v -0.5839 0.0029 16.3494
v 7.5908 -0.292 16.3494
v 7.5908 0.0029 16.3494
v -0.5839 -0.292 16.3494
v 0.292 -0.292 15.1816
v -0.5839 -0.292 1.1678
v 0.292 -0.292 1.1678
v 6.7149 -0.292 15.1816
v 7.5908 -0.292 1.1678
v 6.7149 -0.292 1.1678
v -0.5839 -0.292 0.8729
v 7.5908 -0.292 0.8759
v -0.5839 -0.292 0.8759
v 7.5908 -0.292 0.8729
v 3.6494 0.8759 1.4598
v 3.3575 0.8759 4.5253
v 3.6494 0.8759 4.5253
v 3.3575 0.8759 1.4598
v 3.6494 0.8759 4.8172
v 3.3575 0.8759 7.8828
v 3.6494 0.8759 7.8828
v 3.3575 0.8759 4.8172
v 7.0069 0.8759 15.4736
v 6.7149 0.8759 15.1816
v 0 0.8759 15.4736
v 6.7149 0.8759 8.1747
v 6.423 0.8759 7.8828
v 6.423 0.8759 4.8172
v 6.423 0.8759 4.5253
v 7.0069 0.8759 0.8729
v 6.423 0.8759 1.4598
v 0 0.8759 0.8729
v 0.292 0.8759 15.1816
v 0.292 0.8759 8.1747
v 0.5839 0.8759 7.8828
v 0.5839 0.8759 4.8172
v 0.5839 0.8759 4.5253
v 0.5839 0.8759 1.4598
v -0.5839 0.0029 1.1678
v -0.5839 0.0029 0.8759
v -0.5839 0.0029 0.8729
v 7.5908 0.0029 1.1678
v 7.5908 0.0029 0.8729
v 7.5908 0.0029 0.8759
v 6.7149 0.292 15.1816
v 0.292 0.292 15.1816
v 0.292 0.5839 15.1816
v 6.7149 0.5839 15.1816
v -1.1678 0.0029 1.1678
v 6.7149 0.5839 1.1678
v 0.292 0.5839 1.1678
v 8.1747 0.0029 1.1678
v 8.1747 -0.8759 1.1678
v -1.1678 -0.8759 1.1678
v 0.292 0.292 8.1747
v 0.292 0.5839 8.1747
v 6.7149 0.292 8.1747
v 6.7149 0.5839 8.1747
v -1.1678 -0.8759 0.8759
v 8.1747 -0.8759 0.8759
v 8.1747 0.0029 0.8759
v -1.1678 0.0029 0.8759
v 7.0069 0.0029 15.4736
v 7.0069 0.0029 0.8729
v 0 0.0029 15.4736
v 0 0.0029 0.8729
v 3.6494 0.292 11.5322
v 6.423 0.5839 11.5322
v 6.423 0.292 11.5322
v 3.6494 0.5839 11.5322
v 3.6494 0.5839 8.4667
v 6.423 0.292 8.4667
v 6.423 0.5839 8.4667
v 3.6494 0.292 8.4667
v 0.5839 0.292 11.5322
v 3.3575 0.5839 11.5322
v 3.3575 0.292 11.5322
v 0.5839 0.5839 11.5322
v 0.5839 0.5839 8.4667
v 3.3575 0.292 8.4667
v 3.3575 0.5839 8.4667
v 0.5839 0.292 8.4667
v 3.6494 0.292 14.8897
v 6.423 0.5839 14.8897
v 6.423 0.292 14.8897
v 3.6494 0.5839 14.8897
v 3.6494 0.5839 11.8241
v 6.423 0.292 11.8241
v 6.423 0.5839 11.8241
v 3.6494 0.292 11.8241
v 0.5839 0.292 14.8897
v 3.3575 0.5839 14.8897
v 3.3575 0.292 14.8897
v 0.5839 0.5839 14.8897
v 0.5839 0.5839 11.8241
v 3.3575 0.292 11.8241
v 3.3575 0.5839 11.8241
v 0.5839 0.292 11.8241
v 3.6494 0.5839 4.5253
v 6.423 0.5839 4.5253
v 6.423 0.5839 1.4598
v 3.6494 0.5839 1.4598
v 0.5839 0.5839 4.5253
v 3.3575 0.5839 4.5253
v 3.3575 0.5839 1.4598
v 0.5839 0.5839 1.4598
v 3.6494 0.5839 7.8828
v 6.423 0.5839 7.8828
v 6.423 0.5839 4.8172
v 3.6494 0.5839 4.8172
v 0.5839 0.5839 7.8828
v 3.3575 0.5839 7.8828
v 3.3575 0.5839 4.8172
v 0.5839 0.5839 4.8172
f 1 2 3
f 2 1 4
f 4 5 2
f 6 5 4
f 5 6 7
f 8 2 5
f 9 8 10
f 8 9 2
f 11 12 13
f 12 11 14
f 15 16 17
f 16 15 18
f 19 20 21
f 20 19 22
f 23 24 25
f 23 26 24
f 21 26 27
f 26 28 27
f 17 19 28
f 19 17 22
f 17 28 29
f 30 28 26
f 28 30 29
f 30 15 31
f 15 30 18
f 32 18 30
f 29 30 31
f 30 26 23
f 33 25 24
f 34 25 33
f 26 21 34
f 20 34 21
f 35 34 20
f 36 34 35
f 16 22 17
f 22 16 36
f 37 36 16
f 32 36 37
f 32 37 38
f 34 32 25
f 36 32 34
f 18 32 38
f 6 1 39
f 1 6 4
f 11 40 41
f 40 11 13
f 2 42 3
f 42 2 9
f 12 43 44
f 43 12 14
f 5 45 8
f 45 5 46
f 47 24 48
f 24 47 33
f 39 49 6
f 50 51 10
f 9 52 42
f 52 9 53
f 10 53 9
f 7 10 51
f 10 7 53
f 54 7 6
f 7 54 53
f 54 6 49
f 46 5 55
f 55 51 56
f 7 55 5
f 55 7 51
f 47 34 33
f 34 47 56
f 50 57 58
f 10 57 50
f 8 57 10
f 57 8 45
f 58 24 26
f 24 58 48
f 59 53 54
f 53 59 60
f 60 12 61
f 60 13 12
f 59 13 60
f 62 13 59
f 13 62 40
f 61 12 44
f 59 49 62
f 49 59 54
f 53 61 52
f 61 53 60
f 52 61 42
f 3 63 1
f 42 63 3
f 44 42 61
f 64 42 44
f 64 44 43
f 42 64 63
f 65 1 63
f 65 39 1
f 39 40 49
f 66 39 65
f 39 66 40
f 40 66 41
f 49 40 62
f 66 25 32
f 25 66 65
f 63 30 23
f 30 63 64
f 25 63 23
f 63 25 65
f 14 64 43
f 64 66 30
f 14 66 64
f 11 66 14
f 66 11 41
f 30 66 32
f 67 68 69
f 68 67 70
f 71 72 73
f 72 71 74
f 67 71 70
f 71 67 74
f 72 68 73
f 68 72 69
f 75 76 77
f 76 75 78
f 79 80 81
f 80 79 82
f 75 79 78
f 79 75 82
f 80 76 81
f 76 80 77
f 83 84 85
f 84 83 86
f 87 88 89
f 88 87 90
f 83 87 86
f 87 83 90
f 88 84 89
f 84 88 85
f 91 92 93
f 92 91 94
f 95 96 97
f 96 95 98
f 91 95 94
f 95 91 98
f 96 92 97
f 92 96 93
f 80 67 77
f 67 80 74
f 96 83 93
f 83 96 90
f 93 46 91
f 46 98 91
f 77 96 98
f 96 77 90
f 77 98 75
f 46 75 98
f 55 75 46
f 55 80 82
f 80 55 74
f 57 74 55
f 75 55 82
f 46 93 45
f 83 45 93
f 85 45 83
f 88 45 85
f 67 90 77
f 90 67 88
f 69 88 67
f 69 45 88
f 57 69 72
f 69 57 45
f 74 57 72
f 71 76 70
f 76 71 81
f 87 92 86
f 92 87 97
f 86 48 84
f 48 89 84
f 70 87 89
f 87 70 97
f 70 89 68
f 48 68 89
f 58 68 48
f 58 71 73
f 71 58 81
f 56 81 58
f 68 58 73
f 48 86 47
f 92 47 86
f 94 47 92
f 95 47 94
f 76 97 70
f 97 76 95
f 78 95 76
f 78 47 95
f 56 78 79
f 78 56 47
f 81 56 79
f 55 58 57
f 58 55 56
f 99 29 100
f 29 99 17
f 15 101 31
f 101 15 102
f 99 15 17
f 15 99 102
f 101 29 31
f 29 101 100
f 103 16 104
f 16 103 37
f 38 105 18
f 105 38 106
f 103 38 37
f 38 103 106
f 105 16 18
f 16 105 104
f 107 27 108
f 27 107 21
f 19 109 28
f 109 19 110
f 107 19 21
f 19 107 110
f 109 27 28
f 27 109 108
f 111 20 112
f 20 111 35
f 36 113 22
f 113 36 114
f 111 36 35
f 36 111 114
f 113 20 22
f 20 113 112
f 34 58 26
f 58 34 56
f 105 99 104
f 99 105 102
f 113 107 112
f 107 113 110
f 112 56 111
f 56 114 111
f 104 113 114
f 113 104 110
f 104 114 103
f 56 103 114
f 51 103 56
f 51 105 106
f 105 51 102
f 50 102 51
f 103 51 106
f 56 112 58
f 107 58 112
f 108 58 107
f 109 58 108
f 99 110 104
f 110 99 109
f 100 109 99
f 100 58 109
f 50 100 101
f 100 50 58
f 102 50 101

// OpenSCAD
/*
OpenSCAD configurable sash window window
Author: Glenn Butcher
License: CC-BY-4.0
*/


//Width of the wall opening into which the window will be inserted
opening_width=24;
//Height of the wall opening into which the window will be inserted
opening_height=48;
//Overall depth of the window
window_depth=4;

//Width of the boards used to make the window frame
board_width=4;
//Thickness of the boards used to make the window frame and sashes
board_thickness=1;

//Width of the muntins, the frame pieces that make up the sash
muntin_width=1;
//Depth of the sash frames
sash_depth=1;

//Number of sashes, max 3
number_sashes=2;

//Sill
sill=1;

//Use this to print the window with/without the spacing to allow inserting a printed window into a separate wall
inset=1;

//Number of rows of panes in the upper sash
upper_sash_layout_rows=2;
//Number of columns of panes in the upper sash
upper_sash_layout_columns=2;

//Number of rows of panes in the middle sash
middle_sash_layout_rows=2;
//Number of columns of panes in the middle sash
middle_sash_layout_columns=2;

//Number of rows of panes in the lower sash
lower_sash_layout_rows=2;
//Number of columns of panes in the lower sash
lower_sash_layout_columns=2;

//Use this to change the depth of the upper sash
upper_sash_offset=0;
//Use this to change the depth of the lower sash
lower_sash_offset=0;



//The modeling scale of the .stl file.  Specifies the denominator of the scale, e.g., 1/87 for HO scale, the default.  Assumes the dimensions specified in the previous parameters are prototype, e.g. 1:1.
modeling_scale=87;
//Scales the model for printing.  Default is 25.4, the multiplier to convert decimal inches to millimeters.
printing_scale=25.4;





upper_sash_layout=[upper_sash_layout_rows,upper_sash_layout_columns]*1;
middle_sash_layout=[middle_sash_layout_rows,middle_sash_layout_columns]*1;
lower_sash_layout=[lower_sash_layout_rows,lower_sash_layout_columns]*1;


//draws a sash with the defined pane layout
module sash(width, height, thickness, depth, panelayout=[2,2]) {
	muntinsh = thickness*2 + thickness*(panelayout[0]-1); //accumulate muntins in height
	muntinsw = thickness*2 + thickness*(panelayout[1]-1); //accumulate muntins in width
	paneheight = (height-muntinsh)/(panelayout[0]);
	panewidth = (width-muntinsw)/(panelayout[1]);
	translate([depth,-width/2,0]) {
		rotate([0,-90,0]) {
			difference() {
				//base sash:
				cube([height, width, depth]);
		
				//subtract panes:
				for (r = [1:1:panelayout[0]]) { //rows
					for (c = [1:1:panelayout[1]]) {  //columns
						translate([thickness*r+paneheight*(r-1),thickness*c+panewidth*(c-1),-depth/2]) 
							cube([paneheight, panewidth, depth*2]);
					}
				}
			}
		}
	}
}

//draws a board in the x direction:
module board(length, width, thickness) {
		translate([0,-width/2,0]) cube([length, width, thickness]);
}

module windowframe(opening_width, opening_height, depth, board_width, board_thickness, sill=1, inset=0) {
	difference() {
		union() {
			difference() {
				translate([0,-(opening_width+board_width)/2,0])
					cube([opening_height+board_width*2,opening_width+board_width,depth]);
				translate([board_width,-(opening_width-board_thickness*2)/2,-depth*2]) //main opening
					cube([opening_height,opening_width-board_thickness*2,depth*4]);
			}
			if (sill) {
				translate([board_width-board_thickness,-(opening_width+board_width*2)/2,0])
					cube([board_thickness,opening_width+board_width*2,depth+board_width/2]);
			}
		}
		
		if (inset) {  //cutouts to support inserting a printed window into a hole
			//left:
			translate([-opening_height,opening_width/2,-0.01])
				cube([opening_height*3,board_width*2,depth-board_thickness]);
			//right:
			translate([-opening_height,-(opening_width/2)-board_width*2,-0.01])
				cube([opening_height*3,board_width*2,depth-board_thickness]);
			//top:
			translate([opening_height+board_width+board_thickness,-opening_width,-0.01])
				cube([board_width,opening_width*2,depth-board_thickness]);
			//bottom:
			bd = sill ? 2 : 1;
			translate([-0.01,-opening_width,-0.01])
				cube([board_width-board_thickness,opening_width*2,(depth-board_thickness)*bd]);
		}
		else if (sill) {
			bd = sill ? 2 : 1;
			translate([-0.01,-opening_width,-0.01])
				cube([board_width-board_thickness,opening_width*2,(depth-board_thickness)*bd]);
		}
		
	}
}


//draws a sash window anchored to an opening width and height with the specified sash layout:
module sash_window(opening_width, opening_height, depth, board_width, board_thickness, sashthickness, sash_depth, uppersash, middlesash, lowersash, sill, inset) {
	rotate([0,-90,90])
	translate([0,-opening_width/2,-depth+board_thickness]) {
		windowframe(opening_width, opening_height, depth, board_width, board_thickness, sill, inset);
		
		if (number_sashes == 2) {
			sh = opening_height/2;
			//lower sash:
			translate([board_width+sh,0,sash_depth+sashthickness])			
				rotate([0,90,0]) 
					sash(opening_width-board_thickness*2,sh,sashthickness,sash_depth,uppersash);
			//upper sash:
			translate([board_width,0,sash_depth])			
				rotate([0,90,0]) 
					sash(opening_width-board_thickness*2,sh,sashthickness,sash_depth, lowersash);
		}
		else if (number_sashes == 3) {
			sh = opening_height/3;
			//upper sash:
			translate([board_width+sh*2,0,sash_depth+sashthickness*2])			
				rotate([0,90,0]) 
					sash(opening_width-board_thickness*2,sh,sashthickness,sash_depth,uppersash);
			//middle sash:
			translate([board_width+sh,0,sash_depth+sashthickness])			
				rotate([0,90,0]) 
					sash(opening_width-board_thickness*2,sh,sashthickness,sash_depth,middlesash);
			//lower sash:
			translate([board_width,0,sash_depth])			
				rotate([0,90,0]) 
					sash(opening_width-board_thickness*2,sh,sashthickness,sash_depth, lowersash);
		}
		else {  // one sash
			sh = opening_height;
			//only sash, uses lower sash numbers:
			translate([board_width,0,sash_depth+sashthickness])			
				rotate([0,90,0]) 
					sash(opening_width-board_thickness*2,sh,sashthickness,sash_depth,lowersash);
		}
	}
}

scale(printing_scale)
	scale(1/modeling_scale)
		sash_window(opening_width, opening_height, window_depth, board_width, board_thickness, muntin_width, sash_depth, upper_sash_layout, middle_sash_layout, lower_sash_layout, sill, inset);
